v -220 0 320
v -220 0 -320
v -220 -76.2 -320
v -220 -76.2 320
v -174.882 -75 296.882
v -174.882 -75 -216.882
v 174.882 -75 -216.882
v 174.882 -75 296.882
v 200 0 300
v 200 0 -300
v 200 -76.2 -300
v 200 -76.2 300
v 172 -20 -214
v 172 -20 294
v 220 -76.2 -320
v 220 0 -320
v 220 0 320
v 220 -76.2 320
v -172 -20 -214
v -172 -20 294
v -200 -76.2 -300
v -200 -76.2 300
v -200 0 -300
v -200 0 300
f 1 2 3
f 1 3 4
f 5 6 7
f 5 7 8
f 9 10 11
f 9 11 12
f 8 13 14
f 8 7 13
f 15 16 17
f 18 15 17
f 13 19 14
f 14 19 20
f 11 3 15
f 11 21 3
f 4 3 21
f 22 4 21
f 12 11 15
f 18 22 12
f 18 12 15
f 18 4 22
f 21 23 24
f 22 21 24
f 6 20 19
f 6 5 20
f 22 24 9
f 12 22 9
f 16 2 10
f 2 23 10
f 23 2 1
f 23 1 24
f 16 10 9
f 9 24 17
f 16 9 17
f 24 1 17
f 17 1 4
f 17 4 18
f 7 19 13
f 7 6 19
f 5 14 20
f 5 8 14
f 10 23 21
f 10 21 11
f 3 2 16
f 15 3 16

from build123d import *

# Parameters (mm, degrees)
F0_W     = 440
F0_H     = 640
F0_W_2   = 400
F0_H_2   = 600
F1_DEPTH = 76.2
F2_W     = 344
F2_H     = 508
F3_DEPTH = 55
F3_TAPER = -3


with BuildPart() as f1:
    # F0 (on Front) → F1 (new body)
    with BuildSketch(Plane.XZ):
        Rectangle(F0_W, F0_H)
        Rectangle(F0_W_2, F0_H_2, mode=Mode.SUBTRACT)
    extrude(amount=F1_DEPTH)


with BuildPart() as f3:
    # F2 (on Front) → F3 (new body)
    with BuildSketch(Plane.XZ):
        Rectangle(F2_W, F2_H)
    extrude(amount=F3_DEPTH, taper=F3_TAPER)


with BuildPart() as f3_1:
    # F4: moved
    add(f3.part.moved(Location((0, -20, 40))))


solid = Compound([f1.part, f3_1.part])
